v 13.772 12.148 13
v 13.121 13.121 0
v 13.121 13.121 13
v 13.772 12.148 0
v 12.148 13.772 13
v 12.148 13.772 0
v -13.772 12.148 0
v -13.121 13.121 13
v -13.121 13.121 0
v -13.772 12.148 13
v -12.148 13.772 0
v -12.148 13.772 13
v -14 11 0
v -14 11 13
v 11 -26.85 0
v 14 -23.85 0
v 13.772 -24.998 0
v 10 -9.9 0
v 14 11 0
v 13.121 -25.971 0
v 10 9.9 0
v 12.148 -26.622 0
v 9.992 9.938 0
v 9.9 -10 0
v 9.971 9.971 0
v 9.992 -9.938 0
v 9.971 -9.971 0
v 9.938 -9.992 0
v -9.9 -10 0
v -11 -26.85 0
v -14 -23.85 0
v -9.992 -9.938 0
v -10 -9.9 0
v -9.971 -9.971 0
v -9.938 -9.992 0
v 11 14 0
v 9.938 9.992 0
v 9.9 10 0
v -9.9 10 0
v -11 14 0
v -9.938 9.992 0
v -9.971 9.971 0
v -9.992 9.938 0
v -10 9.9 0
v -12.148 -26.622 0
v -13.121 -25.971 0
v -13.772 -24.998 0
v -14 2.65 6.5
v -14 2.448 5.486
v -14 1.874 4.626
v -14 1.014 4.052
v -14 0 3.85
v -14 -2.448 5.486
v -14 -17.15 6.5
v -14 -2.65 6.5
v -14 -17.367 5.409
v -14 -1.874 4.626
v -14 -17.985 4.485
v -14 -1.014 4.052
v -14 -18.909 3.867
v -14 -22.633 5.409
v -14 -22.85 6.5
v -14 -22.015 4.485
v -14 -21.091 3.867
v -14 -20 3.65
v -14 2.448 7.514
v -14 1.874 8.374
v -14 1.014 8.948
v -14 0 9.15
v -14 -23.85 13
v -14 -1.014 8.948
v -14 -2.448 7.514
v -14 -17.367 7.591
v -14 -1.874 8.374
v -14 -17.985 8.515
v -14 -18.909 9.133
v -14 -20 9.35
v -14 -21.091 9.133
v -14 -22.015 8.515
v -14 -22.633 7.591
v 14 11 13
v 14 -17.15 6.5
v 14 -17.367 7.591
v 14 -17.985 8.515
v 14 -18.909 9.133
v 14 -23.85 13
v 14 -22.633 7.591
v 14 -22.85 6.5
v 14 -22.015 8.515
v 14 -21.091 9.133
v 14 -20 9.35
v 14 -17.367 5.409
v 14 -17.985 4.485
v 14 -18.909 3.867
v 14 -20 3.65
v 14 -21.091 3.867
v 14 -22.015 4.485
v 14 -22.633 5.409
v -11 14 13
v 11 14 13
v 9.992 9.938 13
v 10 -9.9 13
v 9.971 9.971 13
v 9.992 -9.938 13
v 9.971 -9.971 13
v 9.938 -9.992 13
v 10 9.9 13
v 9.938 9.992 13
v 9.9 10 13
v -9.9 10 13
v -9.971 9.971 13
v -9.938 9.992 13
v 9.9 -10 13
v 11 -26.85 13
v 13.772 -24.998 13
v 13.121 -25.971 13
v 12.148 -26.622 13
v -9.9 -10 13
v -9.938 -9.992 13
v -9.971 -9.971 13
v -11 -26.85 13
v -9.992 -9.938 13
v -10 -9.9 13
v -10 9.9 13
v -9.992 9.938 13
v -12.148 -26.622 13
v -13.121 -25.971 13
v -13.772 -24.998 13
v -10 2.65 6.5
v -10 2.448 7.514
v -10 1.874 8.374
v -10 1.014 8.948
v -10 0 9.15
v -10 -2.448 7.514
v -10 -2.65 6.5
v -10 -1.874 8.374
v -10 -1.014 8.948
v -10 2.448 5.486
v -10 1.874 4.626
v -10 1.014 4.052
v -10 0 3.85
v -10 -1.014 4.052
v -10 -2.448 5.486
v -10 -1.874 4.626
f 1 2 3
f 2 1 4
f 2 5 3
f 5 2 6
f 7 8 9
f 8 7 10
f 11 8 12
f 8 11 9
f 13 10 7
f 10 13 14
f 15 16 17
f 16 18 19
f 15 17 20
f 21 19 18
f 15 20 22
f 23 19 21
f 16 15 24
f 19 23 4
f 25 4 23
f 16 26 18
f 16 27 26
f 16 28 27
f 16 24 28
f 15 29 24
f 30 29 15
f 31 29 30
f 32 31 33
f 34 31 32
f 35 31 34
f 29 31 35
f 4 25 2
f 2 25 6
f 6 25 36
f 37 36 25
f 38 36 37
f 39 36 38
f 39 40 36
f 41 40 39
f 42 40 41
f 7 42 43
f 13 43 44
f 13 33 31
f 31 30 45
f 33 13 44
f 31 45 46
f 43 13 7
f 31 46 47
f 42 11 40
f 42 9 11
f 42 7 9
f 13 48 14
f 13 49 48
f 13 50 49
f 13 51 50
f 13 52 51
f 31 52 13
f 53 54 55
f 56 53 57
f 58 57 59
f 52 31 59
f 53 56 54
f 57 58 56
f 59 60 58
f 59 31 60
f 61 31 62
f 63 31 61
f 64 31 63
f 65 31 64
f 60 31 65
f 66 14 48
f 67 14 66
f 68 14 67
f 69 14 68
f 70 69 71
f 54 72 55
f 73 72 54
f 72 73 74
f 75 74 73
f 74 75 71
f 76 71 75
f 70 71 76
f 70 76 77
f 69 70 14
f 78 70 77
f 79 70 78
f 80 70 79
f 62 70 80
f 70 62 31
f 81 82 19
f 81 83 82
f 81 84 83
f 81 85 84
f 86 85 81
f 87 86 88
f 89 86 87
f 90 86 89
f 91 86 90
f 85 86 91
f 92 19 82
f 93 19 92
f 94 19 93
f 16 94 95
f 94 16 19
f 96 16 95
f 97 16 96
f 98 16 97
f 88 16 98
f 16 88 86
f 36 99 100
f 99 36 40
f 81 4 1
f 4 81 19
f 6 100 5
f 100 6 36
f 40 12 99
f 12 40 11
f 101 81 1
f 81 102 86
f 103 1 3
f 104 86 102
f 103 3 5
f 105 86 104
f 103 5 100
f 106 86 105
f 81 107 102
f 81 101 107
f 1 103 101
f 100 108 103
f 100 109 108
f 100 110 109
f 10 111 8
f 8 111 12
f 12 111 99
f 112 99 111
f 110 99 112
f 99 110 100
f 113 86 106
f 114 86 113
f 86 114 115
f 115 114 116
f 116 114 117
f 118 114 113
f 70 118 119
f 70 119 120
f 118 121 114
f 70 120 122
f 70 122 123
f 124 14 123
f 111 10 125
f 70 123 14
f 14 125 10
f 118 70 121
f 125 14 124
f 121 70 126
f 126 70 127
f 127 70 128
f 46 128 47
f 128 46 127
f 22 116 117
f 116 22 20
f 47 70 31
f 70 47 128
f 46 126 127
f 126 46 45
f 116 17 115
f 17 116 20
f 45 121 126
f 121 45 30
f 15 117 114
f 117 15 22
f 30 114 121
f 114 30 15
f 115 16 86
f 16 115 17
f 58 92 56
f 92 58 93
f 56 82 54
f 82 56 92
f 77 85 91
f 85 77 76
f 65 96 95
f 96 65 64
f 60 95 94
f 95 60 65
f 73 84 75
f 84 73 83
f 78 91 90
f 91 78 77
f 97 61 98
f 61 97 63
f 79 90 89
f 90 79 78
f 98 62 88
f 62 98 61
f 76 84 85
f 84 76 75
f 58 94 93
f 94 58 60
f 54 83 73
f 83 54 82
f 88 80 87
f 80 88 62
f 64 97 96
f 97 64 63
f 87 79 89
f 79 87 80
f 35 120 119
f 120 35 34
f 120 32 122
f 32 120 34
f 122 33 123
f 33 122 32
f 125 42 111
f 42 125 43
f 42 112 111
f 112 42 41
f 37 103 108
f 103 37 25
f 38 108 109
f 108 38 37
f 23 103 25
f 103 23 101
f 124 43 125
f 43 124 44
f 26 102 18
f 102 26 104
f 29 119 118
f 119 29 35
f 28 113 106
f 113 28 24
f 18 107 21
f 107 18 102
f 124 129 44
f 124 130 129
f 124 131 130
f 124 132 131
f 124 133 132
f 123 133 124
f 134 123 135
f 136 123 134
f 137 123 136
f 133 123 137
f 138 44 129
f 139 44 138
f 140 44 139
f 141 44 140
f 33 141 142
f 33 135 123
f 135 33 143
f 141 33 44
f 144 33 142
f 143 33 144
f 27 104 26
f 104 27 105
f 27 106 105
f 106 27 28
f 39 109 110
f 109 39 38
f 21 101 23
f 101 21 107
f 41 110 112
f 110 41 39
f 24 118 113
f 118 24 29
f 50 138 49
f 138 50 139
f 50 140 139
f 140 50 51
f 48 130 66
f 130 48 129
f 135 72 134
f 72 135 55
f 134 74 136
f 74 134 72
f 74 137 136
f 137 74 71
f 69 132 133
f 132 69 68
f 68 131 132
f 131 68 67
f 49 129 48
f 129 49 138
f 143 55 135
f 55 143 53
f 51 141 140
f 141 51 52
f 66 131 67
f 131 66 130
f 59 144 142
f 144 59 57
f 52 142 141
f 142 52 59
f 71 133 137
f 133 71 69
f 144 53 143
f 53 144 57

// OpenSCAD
// file: libs/rcube.scad
module rcube(size,radius){
linear_extrude(height=size[2])
if(radius>0){
hull()
{
    // place 4 circles in the corners, with the given radius
    translate([(-size[0]/2)+(radius), (-size[1]/2)+(radius), 0])
    circle(r=radius);

    translate([(size[0]/2)-(radius), (-size[1]/2)+(radius), 0])
    circle(r=radius);

    translate([(-size[0]/2)+(radius), (size[1]/2)-(radius), 0])
    circle(r=radius);

    translate([(size[0]/2)-(radius), (size[1]/2)-(radius), 0])
    circle(r=radius);
}
}
if(radius==0){
translate([0,0,size[2]/2])cube(size,center=true);
}
}
// file: parameter.scad
//-------Parameter GHarp----------------------------------------------------

strScale=650;
strDia=3;
strPosX=20;
strPosY=-20;
slotXY=20;
nStr=3;

nema17_height=40;
nema17_width=42;
nema17_shftDia=5;
nema17_shftLen=28;
nema17_holeDist=31;
Nema17_gearDia=23;

tuner_bDi=7.8;
tuner_bDo=22.2;
tuner_bZ=10;
tuner_rThick=5;
//tuner_tDia=strPosX*2; (big)
tuner_tDia=strPosX*2-10;
tuner_leverZ=10;
tuner_zPos=225;
tuner_strDia=strDia[0];
tuner_leverY=35;

//----------Kickup----------------------------------------------------

kickup_baseX=17;
kickup_baseY=13;
kickup_zAdjDia=3.3;
kickup_zAdjL=10;
kickup_zAdjDist=10.5;
kickup_zAdjOff=4;
//------------------------------------------------------------------------

slide_cpDst=1.5;
slide_rackPosX=(55-12.5);

m3Dia=3.3;
m3NutD=6.6;
m4Dia=4.3;
m4NutD=8.3;
m4NutZ=5;
m5Dia=5.3;
m5HeadD=9.6;

edgeR=3;

gearXPos=57;
gearYPos=0;
gearZPos=360;

rackScrD=20;
rack_X=13;
rack_Y=15.5;
rack_extOffX=0;

bearGearD=25;
mntGrD=20.5; //mount gear distance

mnt_pcbA_X=157;
mnt_pcbA_Y=101;

//---------End Parameter GHarp-----------------------------------------------


////-------Parameter Bass----------------------------------------------------

//strScale=650;
//strDia=4;
//strPosX=20;
//strPosY=-20;
//slotXY=20;
//
//nema17_height=40;
//nema17_width=42;
//nema17_shftDia=5;
//nema17_shftLen=28;
//nema17_holeDist=31;
//Nema17_gearDia=23;
//
//tuner_bDi=7.8;
//tuner_bDo=22.2;
//tuner_bZ=10;
//tuner_rThick=5;
////tuner_tDia=strPosX*2; (big)
//tuner_tDia=strPosX*2-10;
//tuner_leverZ=10;
//tuner_zPos=225;
//tuner_strDia=strDia[0];
//tuner_leverY=35;
//
////----------Kickup----------------------------------------------------
//
//
//kickup_baseX=22;
//kickup_baseY=15;
//kickup_zAdjDia=3.3;
//kickup_zAdjL=10;
//kickup_zAdjDist=13;
//kickup_zAdjOff=4;
//
//
//slide_cpDst=1.5;
//slide_rackPosX=(55-12.5);
//
//m3NutD=6.6;
//m4Dia=4.3;
//m4NutD=8.3;
//m5Dia=5.3;
//
//edgeR=3;
//
//gearXPos=57;
//gearYPos=0;
//gearZPos=360;
//
//rackScrD=20;
//rack_X=13;
//rack_Y=15.5;
//rack_extOffX=0;
//
//bearGearD=25;
//mntGrD=20.5; //mount gear distance
////
//////---------End Bass-----------------------------------------------
// main file
include <parameter.scad>
include <libs/rcube.scad>;

nut();

module nut(){
$fn=16;
shftDia=5.7;
nutDia=11.5;
nutZ=2.5;
wthick=4;
edgeR=3;
adjDist=4;

x=slotXY+wthick*2;
yA=slotXY+wthick*2;
yB=strPosX+shftDia/2+wthick; 
z=nutDia+1.5;

difference(){
union(){
translate([0,0,0])rcube([x,yA,z],edgeR);
translate([0,-yB/2,0])rcube([x,yB,z],edgeR);
}
translate([0,strPosY,z/2])rotate([0,90,0])cylinder(d=shftDia,h=x*2,center=true);

translate([0,0,-1])rcube([slotXY,slotXY,z+2],0.1);
translate([0,0,z/2])rotate([0,-90,0])cylinder(d=m5Dia,h=x*2);
}
}
